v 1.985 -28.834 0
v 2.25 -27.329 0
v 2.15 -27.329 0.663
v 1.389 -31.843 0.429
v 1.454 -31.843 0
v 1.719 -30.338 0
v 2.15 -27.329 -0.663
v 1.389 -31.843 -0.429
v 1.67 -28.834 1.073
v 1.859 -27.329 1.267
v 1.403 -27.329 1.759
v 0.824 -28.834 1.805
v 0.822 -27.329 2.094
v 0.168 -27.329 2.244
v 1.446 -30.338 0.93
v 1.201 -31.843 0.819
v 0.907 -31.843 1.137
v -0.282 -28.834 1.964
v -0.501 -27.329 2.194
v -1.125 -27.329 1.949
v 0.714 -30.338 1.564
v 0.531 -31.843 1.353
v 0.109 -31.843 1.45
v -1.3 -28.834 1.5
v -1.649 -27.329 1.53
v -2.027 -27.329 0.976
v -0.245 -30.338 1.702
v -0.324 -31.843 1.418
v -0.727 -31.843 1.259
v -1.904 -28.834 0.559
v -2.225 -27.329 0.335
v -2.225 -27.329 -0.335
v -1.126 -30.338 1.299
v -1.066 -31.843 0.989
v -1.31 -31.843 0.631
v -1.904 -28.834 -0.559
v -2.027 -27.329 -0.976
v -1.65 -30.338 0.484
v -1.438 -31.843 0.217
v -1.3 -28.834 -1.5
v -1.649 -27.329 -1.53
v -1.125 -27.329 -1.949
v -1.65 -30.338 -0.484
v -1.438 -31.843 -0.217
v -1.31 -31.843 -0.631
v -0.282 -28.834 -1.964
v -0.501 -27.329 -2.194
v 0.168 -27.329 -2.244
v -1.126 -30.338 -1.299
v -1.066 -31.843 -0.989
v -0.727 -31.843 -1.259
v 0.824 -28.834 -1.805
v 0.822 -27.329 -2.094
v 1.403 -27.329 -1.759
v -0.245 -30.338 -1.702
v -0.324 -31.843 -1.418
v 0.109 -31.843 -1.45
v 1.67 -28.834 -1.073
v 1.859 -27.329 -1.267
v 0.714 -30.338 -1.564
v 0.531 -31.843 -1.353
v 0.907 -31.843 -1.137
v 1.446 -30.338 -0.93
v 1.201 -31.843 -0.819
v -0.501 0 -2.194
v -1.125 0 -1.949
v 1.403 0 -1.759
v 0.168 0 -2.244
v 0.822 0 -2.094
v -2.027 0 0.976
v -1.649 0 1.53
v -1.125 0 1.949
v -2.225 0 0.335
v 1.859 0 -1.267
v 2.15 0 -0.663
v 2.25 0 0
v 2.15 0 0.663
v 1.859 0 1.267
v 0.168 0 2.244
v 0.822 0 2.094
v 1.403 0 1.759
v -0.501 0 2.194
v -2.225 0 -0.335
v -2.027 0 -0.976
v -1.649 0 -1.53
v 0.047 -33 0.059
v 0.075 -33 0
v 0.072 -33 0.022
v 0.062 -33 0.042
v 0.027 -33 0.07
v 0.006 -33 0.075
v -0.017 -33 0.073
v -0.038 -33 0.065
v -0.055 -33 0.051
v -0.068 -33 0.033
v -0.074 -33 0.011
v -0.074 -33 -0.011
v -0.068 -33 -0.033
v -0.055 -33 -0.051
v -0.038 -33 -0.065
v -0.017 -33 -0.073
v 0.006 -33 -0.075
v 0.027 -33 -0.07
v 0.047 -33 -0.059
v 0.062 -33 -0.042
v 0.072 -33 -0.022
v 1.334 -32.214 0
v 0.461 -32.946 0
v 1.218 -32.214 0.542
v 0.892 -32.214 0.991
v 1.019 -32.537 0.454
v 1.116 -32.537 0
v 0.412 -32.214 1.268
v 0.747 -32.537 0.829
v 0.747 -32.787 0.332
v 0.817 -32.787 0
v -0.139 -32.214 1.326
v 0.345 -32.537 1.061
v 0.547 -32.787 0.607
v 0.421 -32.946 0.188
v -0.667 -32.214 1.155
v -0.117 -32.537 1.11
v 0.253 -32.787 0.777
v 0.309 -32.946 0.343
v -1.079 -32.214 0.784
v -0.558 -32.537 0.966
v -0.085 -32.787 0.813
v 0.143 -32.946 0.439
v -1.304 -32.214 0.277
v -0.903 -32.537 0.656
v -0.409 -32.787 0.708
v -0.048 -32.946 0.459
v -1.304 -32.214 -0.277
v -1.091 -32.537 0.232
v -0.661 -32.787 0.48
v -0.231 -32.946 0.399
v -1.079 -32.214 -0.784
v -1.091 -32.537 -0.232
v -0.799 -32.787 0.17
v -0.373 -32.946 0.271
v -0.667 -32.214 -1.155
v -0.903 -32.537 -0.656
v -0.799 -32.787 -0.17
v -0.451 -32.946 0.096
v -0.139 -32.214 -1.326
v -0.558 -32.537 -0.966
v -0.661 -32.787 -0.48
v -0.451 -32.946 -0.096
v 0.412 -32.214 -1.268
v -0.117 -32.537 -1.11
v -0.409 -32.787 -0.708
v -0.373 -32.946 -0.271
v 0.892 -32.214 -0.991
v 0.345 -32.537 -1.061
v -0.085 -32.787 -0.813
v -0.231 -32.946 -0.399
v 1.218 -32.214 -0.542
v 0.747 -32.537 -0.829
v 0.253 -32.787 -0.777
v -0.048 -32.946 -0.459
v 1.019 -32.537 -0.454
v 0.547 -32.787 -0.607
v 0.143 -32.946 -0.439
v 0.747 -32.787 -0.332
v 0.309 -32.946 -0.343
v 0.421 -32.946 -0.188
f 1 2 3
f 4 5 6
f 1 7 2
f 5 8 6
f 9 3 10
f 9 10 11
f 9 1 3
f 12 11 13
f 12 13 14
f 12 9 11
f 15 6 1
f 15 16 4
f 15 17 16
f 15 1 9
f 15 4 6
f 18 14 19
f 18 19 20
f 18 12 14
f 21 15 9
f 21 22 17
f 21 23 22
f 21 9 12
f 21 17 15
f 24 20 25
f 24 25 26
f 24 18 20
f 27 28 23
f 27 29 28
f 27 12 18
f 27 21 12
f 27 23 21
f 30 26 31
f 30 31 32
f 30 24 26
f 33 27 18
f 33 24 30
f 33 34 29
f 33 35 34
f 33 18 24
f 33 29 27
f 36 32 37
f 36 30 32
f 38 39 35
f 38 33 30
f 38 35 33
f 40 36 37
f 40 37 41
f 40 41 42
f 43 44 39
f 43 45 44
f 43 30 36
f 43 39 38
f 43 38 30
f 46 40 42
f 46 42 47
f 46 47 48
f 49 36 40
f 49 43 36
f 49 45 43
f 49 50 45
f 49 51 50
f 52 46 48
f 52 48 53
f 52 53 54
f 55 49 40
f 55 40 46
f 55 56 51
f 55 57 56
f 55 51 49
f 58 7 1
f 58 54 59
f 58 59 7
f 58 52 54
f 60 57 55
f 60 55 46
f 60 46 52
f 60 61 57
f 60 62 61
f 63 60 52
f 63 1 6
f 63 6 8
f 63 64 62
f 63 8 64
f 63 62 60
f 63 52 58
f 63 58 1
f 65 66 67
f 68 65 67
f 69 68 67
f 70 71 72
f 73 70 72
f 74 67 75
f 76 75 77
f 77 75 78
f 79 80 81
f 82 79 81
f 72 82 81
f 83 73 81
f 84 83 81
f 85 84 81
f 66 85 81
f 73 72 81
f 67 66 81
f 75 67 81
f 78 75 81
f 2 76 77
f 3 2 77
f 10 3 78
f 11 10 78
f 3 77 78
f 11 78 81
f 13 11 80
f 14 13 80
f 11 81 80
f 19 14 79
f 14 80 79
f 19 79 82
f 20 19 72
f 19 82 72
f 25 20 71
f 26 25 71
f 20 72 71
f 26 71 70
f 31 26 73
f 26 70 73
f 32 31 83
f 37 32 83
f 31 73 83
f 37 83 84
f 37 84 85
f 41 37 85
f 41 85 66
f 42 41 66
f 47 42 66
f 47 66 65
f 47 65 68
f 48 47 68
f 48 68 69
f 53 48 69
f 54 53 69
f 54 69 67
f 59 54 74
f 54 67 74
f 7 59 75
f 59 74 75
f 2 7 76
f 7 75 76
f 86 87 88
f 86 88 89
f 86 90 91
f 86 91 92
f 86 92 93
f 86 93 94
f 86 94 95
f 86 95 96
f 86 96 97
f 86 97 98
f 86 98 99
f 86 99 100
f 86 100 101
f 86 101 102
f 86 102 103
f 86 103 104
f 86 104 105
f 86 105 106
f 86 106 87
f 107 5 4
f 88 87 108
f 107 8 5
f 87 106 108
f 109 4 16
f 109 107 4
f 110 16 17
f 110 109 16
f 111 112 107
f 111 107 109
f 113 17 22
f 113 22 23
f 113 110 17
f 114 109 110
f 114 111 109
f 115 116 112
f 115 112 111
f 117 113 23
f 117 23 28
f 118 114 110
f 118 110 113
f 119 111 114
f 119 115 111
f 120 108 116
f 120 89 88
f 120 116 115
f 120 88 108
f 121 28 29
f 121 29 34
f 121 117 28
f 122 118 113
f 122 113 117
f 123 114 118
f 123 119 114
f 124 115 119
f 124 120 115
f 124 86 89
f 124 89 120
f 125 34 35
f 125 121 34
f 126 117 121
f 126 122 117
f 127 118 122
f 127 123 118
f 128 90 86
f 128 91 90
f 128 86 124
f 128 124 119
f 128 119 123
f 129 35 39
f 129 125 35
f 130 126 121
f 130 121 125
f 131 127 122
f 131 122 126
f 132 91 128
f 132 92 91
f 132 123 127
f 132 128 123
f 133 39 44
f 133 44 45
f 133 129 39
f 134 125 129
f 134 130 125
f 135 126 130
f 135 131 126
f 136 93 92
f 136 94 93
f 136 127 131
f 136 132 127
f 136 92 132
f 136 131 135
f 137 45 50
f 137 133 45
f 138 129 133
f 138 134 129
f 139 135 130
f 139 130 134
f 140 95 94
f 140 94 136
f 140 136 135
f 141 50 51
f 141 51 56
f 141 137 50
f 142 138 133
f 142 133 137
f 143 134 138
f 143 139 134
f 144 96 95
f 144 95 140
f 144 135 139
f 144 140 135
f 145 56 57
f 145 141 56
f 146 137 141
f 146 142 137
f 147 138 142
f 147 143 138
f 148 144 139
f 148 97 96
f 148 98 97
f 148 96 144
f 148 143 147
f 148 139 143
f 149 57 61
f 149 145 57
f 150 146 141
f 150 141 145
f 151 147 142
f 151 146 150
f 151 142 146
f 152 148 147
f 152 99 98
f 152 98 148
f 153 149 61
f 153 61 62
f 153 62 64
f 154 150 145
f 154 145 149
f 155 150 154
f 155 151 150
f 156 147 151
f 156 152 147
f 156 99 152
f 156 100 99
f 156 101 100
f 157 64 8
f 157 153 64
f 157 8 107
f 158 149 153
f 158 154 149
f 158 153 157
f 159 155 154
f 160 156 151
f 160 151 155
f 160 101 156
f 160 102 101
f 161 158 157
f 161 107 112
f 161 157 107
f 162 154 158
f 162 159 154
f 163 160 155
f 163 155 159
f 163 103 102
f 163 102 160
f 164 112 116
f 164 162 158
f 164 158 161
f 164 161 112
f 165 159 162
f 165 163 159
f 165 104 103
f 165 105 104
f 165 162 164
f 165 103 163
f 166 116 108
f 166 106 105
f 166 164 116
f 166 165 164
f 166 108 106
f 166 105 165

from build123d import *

# Parameters (mm, degrees)
F0_R     = 2.25
F1_DEPTH = 33
F2_SIZE2 = 1
F2_SIZE  = 5.6712818196
F3_R     = 1.4


with BuildPart() as f1:
    # F0 (on Front) → F1 (new body)
    with BuildSketch(Plane.XZ):
        Circle(F0_R)
    extrude(amount=F1_DEPTH)

    # F2
    f2_edges = [f1.edges().sort_by_distance(p)[0] for p in [
        (-2.25, -33, 0),
    ]]
    f2_side = f1.faces().sort_by_distance((-2.25, -16.5, 0))[0]
    chamfer(f2_edges, length=F2_SIZE, length2=F2_SIZE2, reference=f2_side)

    # F3
    f3_edges = [f1.edges().sort_by_distance(p)[0] for p in [
        (-1.25, -33, 0),
    ]]
    fillet(f3_edges, radius=F3_R)


solid = f1.part
